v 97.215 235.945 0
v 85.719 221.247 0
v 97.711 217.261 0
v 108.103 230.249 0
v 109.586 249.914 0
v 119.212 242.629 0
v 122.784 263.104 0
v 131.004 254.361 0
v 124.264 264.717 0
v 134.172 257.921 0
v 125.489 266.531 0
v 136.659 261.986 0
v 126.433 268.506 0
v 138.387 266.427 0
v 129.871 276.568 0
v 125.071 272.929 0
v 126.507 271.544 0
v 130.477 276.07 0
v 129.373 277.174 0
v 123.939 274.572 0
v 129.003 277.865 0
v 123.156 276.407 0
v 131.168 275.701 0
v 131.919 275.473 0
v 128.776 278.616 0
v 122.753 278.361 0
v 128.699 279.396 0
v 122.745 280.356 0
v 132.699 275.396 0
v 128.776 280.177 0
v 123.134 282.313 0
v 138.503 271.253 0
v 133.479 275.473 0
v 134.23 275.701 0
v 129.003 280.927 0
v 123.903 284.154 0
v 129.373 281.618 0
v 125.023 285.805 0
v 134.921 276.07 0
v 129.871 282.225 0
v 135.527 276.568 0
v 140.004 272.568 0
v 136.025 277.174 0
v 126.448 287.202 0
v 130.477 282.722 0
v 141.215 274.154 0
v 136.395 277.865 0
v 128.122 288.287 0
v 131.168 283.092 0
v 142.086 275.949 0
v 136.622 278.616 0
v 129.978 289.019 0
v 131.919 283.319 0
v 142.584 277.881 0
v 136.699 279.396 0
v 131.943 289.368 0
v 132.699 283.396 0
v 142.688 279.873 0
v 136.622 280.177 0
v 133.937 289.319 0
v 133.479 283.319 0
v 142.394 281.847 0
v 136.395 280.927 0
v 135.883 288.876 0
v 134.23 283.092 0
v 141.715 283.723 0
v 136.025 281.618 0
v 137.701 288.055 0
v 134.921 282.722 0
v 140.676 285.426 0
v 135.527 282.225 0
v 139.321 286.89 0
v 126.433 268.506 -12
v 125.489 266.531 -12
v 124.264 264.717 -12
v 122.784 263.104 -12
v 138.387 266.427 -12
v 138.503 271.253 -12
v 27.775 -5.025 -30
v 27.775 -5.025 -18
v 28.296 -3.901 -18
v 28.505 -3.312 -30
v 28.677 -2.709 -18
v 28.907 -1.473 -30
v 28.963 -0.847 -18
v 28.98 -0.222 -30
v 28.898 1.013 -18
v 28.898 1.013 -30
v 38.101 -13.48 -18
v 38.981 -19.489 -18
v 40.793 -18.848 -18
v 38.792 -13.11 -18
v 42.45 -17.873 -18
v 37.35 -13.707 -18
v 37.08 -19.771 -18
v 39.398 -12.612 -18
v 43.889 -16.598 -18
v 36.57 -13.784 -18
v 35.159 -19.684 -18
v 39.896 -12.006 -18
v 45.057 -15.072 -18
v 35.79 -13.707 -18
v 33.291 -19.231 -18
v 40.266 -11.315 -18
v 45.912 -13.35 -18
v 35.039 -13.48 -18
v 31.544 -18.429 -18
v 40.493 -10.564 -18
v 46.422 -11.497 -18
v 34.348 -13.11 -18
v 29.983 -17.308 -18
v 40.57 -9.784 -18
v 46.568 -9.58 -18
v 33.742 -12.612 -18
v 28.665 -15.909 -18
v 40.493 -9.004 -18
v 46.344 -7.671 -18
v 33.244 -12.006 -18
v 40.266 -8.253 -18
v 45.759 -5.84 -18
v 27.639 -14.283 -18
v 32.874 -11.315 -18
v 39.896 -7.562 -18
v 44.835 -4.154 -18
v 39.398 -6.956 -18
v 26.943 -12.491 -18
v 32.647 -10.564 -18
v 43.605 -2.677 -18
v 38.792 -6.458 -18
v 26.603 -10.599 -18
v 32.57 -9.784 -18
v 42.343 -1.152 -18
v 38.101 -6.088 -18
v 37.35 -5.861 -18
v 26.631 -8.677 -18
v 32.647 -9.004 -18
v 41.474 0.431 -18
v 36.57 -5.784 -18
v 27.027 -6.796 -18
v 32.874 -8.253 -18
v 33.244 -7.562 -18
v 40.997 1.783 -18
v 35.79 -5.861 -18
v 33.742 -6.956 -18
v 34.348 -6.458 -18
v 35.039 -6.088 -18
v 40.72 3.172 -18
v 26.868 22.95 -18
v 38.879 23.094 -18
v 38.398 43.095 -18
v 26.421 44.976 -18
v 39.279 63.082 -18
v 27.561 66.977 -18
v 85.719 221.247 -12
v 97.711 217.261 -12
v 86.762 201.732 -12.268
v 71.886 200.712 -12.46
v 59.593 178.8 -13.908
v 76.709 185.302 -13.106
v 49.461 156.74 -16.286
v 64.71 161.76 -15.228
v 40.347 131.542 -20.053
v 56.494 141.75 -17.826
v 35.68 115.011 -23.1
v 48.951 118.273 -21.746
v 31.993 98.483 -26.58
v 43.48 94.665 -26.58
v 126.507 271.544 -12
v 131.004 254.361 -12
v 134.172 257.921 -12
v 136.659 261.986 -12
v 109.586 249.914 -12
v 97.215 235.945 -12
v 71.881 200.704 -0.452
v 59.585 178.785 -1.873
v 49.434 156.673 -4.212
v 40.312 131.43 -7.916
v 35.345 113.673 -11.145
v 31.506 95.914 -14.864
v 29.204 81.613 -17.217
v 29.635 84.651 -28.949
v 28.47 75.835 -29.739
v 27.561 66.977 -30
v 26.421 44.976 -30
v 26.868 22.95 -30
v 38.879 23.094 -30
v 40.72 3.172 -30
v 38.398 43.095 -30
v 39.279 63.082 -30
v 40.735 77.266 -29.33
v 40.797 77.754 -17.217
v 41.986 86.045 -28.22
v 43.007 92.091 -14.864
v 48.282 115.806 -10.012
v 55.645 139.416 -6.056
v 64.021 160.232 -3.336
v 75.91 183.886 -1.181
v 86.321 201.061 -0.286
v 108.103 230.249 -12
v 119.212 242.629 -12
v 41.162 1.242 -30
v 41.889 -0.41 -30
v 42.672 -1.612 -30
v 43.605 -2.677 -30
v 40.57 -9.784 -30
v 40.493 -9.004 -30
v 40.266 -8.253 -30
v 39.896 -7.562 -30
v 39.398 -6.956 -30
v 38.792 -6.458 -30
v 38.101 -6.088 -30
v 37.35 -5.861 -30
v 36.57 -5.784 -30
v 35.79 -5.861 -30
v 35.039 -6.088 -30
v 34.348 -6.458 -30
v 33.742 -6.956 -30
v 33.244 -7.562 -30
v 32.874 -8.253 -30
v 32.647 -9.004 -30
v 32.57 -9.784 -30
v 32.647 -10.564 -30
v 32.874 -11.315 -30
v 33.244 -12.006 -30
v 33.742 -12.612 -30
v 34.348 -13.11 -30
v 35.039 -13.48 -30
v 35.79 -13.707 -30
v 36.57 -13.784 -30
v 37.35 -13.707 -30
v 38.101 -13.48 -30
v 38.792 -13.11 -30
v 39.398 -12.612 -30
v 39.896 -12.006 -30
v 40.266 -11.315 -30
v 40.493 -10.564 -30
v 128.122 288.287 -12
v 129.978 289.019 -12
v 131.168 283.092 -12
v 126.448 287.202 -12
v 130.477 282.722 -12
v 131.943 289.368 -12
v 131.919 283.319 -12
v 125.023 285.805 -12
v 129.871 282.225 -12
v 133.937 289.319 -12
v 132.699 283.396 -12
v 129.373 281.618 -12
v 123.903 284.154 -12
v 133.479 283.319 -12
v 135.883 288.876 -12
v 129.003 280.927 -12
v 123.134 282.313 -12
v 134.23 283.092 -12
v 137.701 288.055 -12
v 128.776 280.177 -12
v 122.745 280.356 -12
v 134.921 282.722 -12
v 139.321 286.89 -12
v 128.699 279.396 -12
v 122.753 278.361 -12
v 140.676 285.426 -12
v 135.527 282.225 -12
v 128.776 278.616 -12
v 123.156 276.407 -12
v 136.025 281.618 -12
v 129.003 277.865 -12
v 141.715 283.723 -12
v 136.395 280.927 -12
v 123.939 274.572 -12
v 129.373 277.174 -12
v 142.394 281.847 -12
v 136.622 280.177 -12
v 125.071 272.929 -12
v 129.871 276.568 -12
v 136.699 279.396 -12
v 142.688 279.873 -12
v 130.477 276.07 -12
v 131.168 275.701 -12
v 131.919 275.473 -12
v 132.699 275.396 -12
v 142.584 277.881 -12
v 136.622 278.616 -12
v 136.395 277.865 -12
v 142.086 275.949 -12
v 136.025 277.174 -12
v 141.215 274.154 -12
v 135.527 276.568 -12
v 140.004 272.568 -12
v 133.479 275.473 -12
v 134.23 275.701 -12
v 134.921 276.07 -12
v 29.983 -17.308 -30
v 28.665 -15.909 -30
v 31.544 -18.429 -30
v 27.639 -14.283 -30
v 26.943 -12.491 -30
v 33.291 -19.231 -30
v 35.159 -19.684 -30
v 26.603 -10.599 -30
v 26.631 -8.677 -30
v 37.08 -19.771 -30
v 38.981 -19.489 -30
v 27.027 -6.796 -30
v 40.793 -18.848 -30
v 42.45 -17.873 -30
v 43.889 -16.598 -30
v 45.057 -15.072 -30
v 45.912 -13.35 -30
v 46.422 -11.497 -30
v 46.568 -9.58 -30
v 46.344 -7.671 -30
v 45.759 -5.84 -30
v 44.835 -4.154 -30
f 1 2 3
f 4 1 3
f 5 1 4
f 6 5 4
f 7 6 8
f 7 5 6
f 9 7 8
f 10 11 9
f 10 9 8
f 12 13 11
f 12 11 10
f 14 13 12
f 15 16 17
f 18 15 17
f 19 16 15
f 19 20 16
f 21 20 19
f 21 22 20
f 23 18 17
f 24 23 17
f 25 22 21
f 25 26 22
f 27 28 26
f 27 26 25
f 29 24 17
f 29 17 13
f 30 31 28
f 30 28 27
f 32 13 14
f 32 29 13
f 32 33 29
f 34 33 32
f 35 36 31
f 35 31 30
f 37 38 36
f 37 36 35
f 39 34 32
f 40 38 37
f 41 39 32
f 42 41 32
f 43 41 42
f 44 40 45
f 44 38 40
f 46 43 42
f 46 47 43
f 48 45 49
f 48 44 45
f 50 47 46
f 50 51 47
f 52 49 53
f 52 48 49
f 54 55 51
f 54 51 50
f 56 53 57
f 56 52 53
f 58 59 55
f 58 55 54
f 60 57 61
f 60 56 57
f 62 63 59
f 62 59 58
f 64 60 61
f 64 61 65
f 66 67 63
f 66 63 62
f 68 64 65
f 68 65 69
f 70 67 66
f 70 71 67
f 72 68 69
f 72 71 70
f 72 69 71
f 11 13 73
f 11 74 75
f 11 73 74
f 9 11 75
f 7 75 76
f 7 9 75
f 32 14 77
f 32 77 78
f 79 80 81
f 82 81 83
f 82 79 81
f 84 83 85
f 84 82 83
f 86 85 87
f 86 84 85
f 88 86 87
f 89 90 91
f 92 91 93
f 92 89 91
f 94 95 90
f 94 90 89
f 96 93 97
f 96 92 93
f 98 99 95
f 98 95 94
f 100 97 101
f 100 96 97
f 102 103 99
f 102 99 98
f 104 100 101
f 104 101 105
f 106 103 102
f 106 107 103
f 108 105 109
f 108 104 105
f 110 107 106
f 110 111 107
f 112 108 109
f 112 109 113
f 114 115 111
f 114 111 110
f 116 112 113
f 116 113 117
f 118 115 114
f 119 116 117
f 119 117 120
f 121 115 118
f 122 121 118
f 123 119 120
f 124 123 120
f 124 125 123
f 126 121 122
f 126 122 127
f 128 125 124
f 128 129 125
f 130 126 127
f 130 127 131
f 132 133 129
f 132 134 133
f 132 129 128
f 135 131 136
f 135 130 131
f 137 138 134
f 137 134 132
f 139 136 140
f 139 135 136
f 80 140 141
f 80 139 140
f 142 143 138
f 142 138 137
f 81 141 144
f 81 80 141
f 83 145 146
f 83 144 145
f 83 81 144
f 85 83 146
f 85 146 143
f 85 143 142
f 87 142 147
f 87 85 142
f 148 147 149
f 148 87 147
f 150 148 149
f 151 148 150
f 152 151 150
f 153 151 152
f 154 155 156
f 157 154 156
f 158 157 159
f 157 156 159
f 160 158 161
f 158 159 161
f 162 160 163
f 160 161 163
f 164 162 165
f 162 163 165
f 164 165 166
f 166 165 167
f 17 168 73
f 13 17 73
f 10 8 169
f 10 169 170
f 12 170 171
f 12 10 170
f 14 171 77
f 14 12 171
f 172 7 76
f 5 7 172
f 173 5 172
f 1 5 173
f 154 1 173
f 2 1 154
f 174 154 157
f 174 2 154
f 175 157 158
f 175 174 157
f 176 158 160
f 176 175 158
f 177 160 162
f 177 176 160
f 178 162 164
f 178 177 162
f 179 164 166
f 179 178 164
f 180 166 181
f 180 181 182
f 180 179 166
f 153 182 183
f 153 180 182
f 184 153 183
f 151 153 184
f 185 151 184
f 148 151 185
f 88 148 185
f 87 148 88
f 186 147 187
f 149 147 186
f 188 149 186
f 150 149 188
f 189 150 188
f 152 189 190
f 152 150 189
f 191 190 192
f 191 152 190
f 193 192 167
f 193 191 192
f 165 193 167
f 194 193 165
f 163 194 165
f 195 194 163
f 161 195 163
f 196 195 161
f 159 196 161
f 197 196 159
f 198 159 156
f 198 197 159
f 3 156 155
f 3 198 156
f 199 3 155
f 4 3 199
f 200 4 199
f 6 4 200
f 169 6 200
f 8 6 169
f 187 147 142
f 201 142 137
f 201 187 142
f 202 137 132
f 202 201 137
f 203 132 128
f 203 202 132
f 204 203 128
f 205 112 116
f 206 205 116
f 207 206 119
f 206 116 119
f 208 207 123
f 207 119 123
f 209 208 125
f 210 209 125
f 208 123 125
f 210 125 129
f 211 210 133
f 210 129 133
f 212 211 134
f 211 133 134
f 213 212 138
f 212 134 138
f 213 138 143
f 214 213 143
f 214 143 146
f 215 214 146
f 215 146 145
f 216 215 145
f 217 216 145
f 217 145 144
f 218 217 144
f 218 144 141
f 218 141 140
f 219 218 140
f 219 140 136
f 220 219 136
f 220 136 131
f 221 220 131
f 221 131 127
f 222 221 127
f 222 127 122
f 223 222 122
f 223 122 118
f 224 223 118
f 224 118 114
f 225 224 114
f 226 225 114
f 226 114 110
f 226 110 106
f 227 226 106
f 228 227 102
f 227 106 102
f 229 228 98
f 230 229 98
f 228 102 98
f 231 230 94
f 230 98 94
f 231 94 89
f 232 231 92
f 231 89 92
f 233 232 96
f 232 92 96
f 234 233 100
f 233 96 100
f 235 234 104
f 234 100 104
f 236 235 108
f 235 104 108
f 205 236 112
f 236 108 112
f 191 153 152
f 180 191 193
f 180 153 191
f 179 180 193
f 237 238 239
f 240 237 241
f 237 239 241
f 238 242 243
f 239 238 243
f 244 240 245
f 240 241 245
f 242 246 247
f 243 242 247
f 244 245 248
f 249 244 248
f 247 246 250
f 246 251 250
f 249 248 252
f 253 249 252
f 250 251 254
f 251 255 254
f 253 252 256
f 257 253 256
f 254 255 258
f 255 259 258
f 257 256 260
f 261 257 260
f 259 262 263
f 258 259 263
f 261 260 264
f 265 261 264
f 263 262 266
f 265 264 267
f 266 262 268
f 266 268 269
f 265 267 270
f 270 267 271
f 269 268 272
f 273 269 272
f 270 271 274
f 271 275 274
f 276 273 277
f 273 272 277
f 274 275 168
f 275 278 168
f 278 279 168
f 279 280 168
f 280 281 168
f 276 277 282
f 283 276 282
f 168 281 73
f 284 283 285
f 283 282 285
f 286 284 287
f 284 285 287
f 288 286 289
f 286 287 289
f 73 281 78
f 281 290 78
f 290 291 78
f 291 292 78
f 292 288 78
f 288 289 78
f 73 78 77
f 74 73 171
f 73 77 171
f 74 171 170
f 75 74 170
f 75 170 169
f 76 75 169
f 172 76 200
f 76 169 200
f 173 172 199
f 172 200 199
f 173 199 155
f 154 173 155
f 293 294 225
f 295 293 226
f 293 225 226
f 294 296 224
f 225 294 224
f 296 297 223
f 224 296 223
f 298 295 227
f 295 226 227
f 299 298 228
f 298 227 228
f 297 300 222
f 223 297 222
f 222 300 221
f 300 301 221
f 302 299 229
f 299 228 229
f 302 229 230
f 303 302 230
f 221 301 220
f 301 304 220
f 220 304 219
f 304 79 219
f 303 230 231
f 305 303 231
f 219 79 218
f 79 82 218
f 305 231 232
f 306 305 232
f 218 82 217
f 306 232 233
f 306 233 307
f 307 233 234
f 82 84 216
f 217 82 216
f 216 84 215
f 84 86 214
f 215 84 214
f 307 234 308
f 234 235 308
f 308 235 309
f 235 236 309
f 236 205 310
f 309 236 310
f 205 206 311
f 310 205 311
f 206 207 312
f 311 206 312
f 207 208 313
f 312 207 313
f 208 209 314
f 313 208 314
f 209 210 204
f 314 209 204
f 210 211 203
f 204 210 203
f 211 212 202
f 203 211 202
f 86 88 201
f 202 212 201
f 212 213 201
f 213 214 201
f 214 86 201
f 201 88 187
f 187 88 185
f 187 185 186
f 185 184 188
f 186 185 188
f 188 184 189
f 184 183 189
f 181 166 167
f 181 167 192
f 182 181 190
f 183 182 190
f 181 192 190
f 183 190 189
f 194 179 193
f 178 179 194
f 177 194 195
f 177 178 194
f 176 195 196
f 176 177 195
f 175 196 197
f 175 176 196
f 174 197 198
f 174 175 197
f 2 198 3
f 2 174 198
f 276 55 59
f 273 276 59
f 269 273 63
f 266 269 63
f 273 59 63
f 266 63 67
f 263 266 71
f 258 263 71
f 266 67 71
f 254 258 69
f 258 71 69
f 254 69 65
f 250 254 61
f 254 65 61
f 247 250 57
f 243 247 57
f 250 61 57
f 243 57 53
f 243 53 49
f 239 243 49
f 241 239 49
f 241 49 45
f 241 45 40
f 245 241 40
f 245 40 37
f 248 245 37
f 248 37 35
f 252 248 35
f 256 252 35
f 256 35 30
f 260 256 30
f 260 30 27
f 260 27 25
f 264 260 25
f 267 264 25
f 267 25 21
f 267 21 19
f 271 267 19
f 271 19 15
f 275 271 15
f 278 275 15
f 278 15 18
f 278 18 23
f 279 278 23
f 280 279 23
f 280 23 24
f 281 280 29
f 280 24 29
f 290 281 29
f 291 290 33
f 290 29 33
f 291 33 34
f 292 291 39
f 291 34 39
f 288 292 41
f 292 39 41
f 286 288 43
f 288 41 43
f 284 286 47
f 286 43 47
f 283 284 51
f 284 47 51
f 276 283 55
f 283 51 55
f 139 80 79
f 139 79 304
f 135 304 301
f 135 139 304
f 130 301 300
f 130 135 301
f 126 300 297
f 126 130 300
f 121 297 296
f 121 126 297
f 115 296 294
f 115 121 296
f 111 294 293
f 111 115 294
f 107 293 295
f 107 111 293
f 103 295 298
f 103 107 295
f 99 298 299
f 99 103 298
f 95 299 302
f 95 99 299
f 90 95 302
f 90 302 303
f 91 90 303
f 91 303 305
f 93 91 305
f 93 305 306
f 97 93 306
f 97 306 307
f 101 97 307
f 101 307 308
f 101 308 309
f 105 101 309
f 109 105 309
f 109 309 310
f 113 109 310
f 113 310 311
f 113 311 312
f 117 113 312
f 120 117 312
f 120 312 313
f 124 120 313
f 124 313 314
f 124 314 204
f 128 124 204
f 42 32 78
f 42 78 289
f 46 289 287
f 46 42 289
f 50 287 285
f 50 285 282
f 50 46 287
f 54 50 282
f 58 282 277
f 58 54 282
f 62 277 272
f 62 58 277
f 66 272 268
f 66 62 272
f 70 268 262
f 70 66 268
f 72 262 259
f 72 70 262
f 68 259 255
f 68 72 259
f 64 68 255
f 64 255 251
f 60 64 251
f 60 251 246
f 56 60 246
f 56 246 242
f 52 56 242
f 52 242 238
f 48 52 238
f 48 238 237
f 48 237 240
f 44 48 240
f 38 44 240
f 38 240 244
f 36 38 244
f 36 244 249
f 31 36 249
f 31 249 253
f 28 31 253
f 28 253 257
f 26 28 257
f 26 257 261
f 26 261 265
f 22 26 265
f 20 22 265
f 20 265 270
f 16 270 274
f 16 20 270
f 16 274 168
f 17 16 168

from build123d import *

# Parameters (mm, degrees)
SKETCH1_R           = 4
BOSS_EXTRUDE1_DEPTH = 30
FILLET1_R           = 10
CUT_EXTRUDE1_DEPTH  = 50


with BuildPart() as part:
    # Sketch1 → Boss-Extrude1 (new body)
    with BuildSketch(Plane.XY):
        with BuildLine():
            Line((138.503487168, 271.253231947), (138.386569071, 266.427133764))
            ThreePointArc((138.386569071, 266.427133764), (135.506043856, 259.89792897), (131.004003349, 254.360820334))
            ThreePointArc((131.004003349, 254.360820334), (55.014402731, 137.639339628), (41.273132032, -0.959004301))
            ThreePointArc((41.273132032, -0.959004301), (38.103150753, -19.665773564), (29.413949453, -2.798948778))
            ThreePointArc((29.413949453, -2.798948778), (43.666158034, 141.541101292), (122.784429578, 263.103737869))
            ThreePointArc((122.784429578, 263.103737869), (124.910300495, 265.601515317), (126.433420754, 268.506394661))
            Line((126.433420754, 268.506394661), (126.507007076, 271.543861264))
            ThreePointArc((126.507007076, 271.543861264), (132.941191098, 289.393266743), (138.503487168, 271.253231947))
        make_face()
        with Locations((36.57, -9.784)):
            Circle(SKETCH1_R, mode=Mode.SUBTRACT)
        with Locations((132.699, 279.3962)):
            Circle(SKETCH1_R, mode=Mode.SUBTRACT)
    extrude(amount=-BOSS_EXTRUDE1_DEPTH)

    # Fillet1
    fillet1_edges = [part.edges().sort_by_distance(p)[0] for p in [
        (29.413949453, -2.798948778, -15),
        (41.273132032, -0.959004301, -15),
    ]]
    fillet(fillet1_edges, radius=FILLET1_R)

    # Sketch2 → Cut-Extrude1 (cut, symmetric)
    with BuildSketch(Plane(origin=(35.859794138, -11.920477788, 0), x_dir=(0, 0, -1), z_dir=(0.9489432648360645, -0.31544679443968165, 0))):
        with BuildLine():
            Line((18, -41.651017654), (18, 72.25142837))
            ThreePointArc((18, 72.25142837), (17.213593845, 86.688920515), (14.863680684, 100.955578225))
            ThreePointArc((14.863680684, 100.955578225), (3.726945122, 168.568287043), (0, 236.990616386))
            Line((0, 236.990616386), (-79.914214629, -10.518807221))
            Line((-79.914214629, -10.518807221), (18, -41.651017654))
        make_face()
        with BuildLine():
            ThreePointArc((12, 236.990616386), (15.655931666, 169.871851405), (26.580467348, 103.547278514))
            ThreePointArc((26.580467348, 103.547278514), (29.14258039, 87.992484876), (30, 72.25142837))
            Line((30, 72.25142837), (155.717662302, 285.460245478))
            Line((155.717662302, 285.460245478), (12, 328.230650316))
            Line((12, 328.230650316), (12, 236.990616386))
        make_face()
    extrude(amount=CUT_EXTRUDE1_DEPTH, both=True, mode=Mode.SUBTRACT)


solid = part.part
